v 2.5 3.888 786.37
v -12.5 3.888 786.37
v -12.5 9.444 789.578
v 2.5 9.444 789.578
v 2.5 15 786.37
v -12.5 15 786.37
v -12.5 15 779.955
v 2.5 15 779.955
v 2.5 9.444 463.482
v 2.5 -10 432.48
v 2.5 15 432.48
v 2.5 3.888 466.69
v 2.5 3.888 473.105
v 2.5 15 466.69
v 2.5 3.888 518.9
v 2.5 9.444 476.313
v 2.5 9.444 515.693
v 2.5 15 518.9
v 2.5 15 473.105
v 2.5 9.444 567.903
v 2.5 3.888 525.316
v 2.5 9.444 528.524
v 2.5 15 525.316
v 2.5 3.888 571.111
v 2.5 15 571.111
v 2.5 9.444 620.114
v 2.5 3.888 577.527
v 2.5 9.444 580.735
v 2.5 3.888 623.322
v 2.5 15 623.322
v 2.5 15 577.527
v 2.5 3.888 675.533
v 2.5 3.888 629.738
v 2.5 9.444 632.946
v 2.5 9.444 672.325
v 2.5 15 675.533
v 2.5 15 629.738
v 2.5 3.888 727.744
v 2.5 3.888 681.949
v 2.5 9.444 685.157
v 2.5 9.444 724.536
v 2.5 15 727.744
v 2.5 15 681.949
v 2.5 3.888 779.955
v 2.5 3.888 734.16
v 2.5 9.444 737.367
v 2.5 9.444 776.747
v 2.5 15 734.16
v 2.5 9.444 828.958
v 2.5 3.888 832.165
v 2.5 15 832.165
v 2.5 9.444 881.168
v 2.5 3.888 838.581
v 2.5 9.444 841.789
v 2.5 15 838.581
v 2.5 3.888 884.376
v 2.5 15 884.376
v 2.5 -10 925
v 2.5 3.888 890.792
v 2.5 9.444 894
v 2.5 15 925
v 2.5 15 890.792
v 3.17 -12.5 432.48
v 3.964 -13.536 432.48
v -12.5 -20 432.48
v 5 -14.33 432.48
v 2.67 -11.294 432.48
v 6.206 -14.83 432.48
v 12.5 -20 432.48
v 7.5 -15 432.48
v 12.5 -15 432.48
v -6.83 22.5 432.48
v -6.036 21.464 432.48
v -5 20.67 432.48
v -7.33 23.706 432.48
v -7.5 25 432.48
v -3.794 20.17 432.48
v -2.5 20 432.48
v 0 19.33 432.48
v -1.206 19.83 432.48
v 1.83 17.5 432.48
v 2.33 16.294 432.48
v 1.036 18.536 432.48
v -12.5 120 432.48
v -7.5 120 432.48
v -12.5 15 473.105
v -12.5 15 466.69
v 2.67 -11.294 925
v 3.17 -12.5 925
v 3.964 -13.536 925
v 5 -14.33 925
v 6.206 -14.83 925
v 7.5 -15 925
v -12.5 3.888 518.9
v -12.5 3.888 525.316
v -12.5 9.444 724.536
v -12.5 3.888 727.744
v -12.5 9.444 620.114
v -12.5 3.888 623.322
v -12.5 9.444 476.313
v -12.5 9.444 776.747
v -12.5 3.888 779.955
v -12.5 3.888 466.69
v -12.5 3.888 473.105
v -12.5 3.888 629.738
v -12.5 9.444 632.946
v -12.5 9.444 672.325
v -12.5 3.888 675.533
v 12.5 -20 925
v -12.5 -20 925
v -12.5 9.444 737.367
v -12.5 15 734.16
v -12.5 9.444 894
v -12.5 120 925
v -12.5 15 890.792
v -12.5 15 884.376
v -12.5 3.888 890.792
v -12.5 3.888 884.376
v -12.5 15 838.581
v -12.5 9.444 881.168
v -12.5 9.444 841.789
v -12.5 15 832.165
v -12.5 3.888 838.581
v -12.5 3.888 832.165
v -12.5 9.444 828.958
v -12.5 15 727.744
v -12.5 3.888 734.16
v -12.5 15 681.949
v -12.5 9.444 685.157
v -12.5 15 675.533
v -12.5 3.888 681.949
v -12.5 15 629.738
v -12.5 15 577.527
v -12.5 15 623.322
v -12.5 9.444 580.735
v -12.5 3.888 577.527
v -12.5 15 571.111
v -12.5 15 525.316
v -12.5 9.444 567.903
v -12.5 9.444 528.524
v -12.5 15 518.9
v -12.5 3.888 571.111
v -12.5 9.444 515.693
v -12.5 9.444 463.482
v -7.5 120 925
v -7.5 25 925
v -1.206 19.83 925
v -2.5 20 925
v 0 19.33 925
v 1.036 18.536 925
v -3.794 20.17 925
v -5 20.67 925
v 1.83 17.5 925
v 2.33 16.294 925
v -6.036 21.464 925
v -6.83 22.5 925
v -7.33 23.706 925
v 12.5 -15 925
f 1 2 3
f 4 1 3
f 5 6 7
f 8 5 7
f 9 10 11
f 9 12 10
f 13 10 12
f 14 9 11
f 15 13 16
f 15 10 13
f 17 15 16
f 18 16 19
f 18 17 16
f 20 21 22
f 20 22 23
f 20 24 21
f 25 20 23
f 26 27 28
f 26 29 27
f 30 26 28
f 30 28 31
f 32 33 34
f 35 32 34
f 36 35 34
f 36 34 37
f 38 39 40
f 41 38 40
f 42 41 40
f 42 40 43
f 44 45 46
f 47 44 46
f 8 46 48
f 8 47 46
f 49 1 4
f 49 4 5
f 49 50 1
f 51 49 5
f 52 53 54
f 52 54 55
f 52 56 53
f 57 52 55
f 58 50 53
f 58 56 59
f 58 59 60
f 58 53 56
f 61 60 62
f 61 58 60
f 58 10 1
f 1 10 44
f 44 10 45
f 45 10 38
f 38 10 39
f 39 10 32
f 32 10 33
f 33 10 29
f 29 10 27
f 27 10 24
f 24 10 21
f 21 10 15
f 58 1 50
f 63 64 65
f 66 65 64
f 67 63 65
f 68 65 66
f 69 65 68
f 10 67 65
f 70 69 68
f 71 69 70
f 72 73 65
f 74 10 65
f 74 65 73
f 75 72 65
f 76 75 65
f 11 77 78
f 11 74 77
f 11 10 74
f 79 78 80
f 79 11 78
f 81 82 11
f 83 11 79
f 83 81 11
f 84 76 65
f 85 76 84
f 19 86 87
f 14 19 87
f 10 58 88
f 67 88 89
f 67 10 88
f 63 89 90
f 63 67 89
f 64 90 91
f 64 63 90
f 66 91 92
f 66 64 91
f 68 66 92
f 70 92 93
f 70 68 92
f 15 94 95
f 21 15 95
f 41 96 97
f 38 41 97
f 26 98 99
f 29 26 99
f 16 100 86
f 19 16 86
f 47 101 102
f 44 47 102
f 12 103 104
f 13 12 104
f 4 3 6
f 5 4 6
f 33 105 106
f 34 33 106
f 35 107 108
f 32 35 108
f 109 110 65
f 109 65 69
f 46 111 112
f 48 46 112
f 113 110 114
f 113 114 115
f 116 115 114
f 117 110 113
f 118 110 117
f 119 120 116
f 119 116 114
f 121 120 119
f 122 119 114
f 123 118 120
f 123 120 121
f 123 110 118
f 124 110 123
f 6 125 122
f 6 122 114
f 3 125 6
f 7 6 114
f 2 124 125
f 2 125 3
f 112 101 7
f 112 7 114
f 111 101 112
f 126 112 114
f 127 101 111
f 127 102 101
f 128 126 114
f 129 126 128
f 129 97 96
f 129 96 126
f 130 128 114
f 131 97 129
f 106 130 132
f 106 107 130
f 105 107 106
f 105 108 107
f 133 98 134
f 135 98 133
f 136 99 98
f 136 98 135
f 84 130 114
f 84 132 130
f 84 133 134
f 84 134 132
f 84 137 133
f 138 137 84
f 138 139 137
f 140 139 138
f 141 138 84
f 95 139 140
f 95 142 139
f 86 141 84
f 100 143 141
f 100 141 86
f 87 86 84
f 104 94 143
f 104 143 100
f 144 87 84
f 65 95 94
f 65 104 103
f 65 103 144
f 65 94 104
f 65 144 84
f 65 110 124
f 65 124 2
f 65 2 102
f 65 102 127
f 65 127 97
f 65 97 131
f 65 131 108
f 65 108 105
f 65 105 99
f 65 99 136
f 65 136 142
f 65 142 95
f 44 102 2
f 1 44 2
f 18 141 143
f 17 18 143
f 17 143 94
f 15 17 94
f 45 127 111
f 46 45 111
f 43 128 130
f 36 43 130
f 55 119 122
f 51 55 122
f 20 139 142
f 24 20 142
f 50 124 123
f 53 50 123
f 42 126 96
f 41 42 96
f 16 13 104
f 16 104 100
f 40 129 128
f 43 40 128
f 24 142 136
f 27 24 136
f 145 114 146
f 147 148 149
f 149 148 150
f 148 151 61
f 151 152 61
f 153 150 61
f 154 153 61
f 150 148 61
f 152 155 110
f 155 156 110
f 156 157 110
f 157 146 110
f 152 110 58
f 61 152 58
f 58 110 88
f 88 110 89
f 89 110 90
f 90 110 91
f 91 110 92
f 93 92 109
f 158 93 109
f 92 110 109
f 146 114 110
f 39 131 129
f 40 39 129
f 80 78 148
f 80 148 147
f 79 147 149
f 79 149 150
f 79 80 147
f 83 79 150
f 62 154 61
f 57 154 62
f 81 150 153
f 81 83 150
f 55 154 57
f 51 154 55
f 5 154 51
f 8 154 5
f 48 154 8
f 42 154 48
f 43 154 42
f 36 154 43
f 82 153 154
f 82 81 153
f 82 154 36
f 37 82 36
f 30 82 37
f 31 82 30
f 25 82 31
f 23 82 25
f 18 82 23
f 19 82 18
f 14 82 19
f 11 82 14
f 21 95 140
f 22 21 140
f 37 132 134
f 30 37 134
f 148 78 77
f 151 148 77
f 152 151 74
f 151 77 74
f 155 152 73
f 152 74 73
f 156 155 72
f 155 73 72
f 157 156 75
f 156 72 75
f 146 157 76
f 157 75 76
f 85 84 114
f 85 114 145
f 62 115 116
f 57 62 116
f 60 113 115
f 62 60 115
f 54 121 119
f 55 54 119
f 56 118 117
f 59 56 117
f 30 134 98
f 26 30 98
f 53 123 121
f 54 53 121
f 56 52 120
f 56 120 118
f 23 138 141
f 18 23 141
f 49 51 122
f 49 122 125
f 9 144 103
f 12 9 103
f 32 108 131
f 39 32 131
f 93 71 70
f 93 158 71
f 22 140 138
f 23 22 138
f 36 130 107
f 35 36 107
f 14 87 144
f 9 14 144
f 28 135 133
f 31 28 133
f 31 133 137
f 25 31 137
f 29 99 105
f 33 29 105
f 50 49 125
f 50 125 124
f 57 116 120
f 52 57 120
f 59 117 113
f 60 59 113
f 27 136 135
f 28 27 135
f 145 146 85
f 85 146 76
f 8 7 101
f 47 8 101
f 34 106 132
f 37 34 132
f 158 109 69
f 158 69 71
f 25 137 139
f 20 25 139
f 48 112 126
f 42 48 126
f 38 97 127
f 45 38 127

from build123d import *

# Parameters (mm, degrees)
GENERAL_EXTRUDE_DEPTH       = 925
ROUNDING_R                  = 5
ROLLER_HOLDERS_DEPTH        = 926.55388822
SKETCH5_W                   = 5
SKETCH5_H                   = 1850
GUARD_RAIL_DEPTH            = 100
GUARD_RAIL_SUPPORT_FILLET_R = 5
CUT_TO_SIZE_DEPTH           = 934.086276825
CUT_TO_SIZE_DEPTH_BACK      = 934.086276825
SKETCH6_W                   = 1357.48
SKETCH6_H                   = 140


with BuildPart() as part:
    # Sketch2 → General extrude (new, symmetric)
    with BuildSketch(Plane.XY):
        Polygon((-12.5, 20), (-12.5, -20), (12.5, -20), (12.5, -15), (2.5, -15), (2.5, 20), align=None)
    extrude(amount=GENERAL_EXTRUDE_DEPTH, both=True)

    # Rounding
    rounding_edges = [part.edges().sort_by_distance(p)[0] for p in [
        (2.5, 20, 0),
        (2.5, -15, 0),
    ]]
    fillet(rounding_edges, radius=ROUNDING_R)

    # Sketch3 → Roller holders (cut, through all)
    with BuildSketch(Plane.ZY.offset(12.5)):
        Polygon((-884.3762927, 3.8875), (-881.168390267, 9.44375), (-884.3762927, 15), (-890.792097567, 15), (-894, 9.44375), (-890.792097567, 3.8875), align=None)
        Polygon((-832.165457693, 3.8875), (-828.957555259, 9.44375), (-832.165457693, 15), (-838.581262559, 15), (-841.789164992, 9.44375), (-838.581262559, 3.8875), align=None)
        Polygon((-779.954622685, 3.8875), (-776.746720252, 9.44375), (-779.954622685, 15), (-786.370427551, 15), (-789.578329984, 9.44375), (-786.370427551, 3.8875), align=None)
        Polygon((-727.743787677, 3.8875), (-724.535885244, 9.44375), (-727.743787677, 15), (-734.159592543, 15), (-737.367494976, 9.44375), (-734.159592543, 3.8875), align=None)
        Polygon((-675.532952669, 3.8875), (-672.325050236, 9.44375), (-675.532952669, 15), (-681.948757535, 15), (-685.156659969, 9.44375), (-681.948757535, 3.8875), align=None)
        Polygon((-623.322117661, 3.8875), (-620.114215228, 9.44375), (-623.322117661, 15), (-629.737922528, 15), (-632.945824961, 9.44375), (-629.737922528, 3.8875), align=None)
        Polygon((-571.111282653, 3.8875), (-567.90338022, 9.44375), (-571.111282653, 15), (-577.52708752, 15), (-580.734989953, 9.44375), (-577.52708752, 3.8875), align=None)
        Polygon((-518.900447645, 3.8875), (-515.692545212, 9.44375), (-518.900447645, 15), (-525.316252512, 15), (-528.524154945, 9.44375), (-525.316252512, 3.8875), align=None)
        Polygon((-466.689612638, 3.8875), (-463.481710204, 9.44375), (-466.689612638, 15), (-473.105417504, 15), (-476.313319937, 9.44375), (-473.105417504, 3.8875), align=None)
        Polygon((-414.47877763, 3.8875), (-411.270875197, 9.44375), (-414.47877763, 15), (-420.894582496, 15), (-424.102484929, 9.44375), (-420.894582496, 3.8875), align=None)
        Polygon((-362.267942622, 3.8875), (-359.060040189, 9.44375), (-362.267942622, 15), (-368.683747488, 15), (-371.891649921, 9.44375), (-368.683747488, 3.8875), align=None)
        Polygon((-310.057107614, 3.8875), (-306.849205181, 9.44375), (-310.057107614, 15), (-316.47291248, 15), (-319.680814914, 9.44375), (-316.47291248, 3.8875), align=None)
        Polygon((-257.846272606, 3.8875), (-254.638370173, 9.44375), (-257.846272606, 15), (-264.262077472, 15), (-267.469979906, 9.44375), (-264.262077472, 3.8875), align=None)
        Polygon((-205.635437598, 3.8875), (-202.427535165, 9.44375), (-205.635437598, 15), (-212.051242465, 15), (-215.259144898, 9.44375), (-212.051242465, 3.8875), align=None)
        Polygon((-153.42460259, 3.8875), (-150.216700157, 9.44375), (-153.42460259, 15), (-159.840407457, 15), (-163.04830989, 9.44375), (-159.840407457, 3.8875), align=None)
        Polygon((-101.213767583, 3.8875), (-98.005865149, 9.44375), (-101.213767583, 15), (-107.629572449, 15), (-110.837474882, 9.44375), (-107.629572449, 3.8875), align=None)
        Polygon((-49.002932575, 3.8875), (-45.795030141, 9.44375), (-49.002932575, 15), (-55.418737441, 15), (-58.626639874, 9.44375), (-55.418737441, 3.8875), align=None)
        Polygon((3.207902433, 3.8875), (6.415804866, 9.44375), (3.207902433, 15), (-3.207902433, 15), (-6.415804866, 9.44375), (-3.207902433, 3.8875), align=None)
        Polygon((55.418737441, 3.8875), (58.626639874, 9.44375), (55.418737441, 15), (49.002932575, 15), (45.795030141, 9.44375), (49.002932575, 3.8875), align=None)
        Polygon((107.629572449, 3.8875), (110.837474882, 9.44375), (107.629572449, 15), (101.213767583, 15), (98.005865149, 9.44375), (101.213767583, 3.8875), align=None)
        Polygon((159.840407457, 3.8875), (163.04830989, 9.44375), (159.840407457, 15), (153.42460259, 15), (150.216700157, 9.44375), (153.42460259, 3.8875), align=None)
        Polygon((212.051242465, 3.8875), (215.259144898, 9.44375), (212.051242465, 15), (205.635437598, 15), (202.427535165, 9.44375), (205.635437598, 3.8875), align=None)
        Polygon((264.262077472, 3.8875), (267.469979906, 9.44375), (264.262077472, 15), (257.846272606, 15), (254.638370173, 9.44375), (257.846272606, 3.8875), align=None)
        Polygon((316.47291248, 3.8875), (319.680814914, 9.44375), (316.47291248, 15), (310.057107614, 15), (306.849205181, 9.44375), (310.057107614, 3.8875), align=None)
        Polygon((368.683747488, 3.8875), (371.891649921, 9.44375), (368.683747488, 15), (362.267942622, 15), (359.060040189, 9.44375), (362.267942622, 3.8875), align=None)
        Polygon((420.894582496, 3.8875), (424.102484929, 9.44375), (420.894582496, 15), (414.47877763, 15), (411.270875197, 9.44375), (414.47877763, 3.8875), align=None)
        Polygon((473.105417504, 3.8875), (476.313319937, 9.44375), (473.105417504, 15), (466.689612638, 15), (463.481710204, 9.44375), (466.689612638, 3.8875), align=None)
        Polygon((525.316252512, 3.8875), (528.524154945, 9.44375), (525.316252512, 15), (518.900447645, 15), (515.692545212, 9.44375), (518.900447645, 3.8875), align=None)
        Polygon((577.52708752, 3.8875), (580.734989953, 9.44375), (577.52708752, 15), (571.111282653, 15), (567.90338022, 9.44375), (571.111282653, 3.8875), align=None)
        Polygon((629.737922528, 3.8875), (632.945824961, 9.44375), (629.737922528, 15), (623.322117661, 15), (620.114215228, 9.44375), (623.322117661, 3.8875), align=None)
        Polygon((681.948757535, 3.8875), (685.156659969, 9.44375), (681.948757535, 15), (675.532952669, 15), (672.325050236, 9.44375), (675.532952669, 3.8875), align=None)
        Polygon((734.159592543, 3.8875), (737.367494976, 9.44375), (734.159592543, 15), (727.743787677, 15), (724.535885244, 9.44375), (727.743787677, 3.8875), align=None)
        Polygon((786.370427551, 3.8875), (789.578329984, 9.44375), (786.370427551, 15), (779.954622685, 15), (776.746720252, 9.44375), (779.954622685, 3.8875), align=None)
        Polygon((838.581262559, 3.8875), (841.789164992, 9.44375), (838.581262559, 15), (832.165457693, 15), (828.957555259, 9.44375), (832.165457693, 3.8875), align=None)
        Polygon((890.792097567, 3.8875), (894, 9.44375), (890.792097567, 15), (884.3762927, 15), (881.168390267, 9.44375), (884.3762927, 3.8875), align=None)
    extrude(amount=-ROLLER_HOLDERS_DEPTH, mode=Mode.SUBTRACT)

    # Sketch5 → Guard rail (add)
    with BuildSketch(Plane(origin=(0, 20, 0), x_dir=(1, 0, 0), z_dir=(0, 1, 0))):
        with Locations((-10, 0)):
            Rectangle(SKETCH5_W, SKETCH5_H)
    extrude(amount=GUARD_RAIL_DEPTH)

    # Guard rail support fillet
    guard_rail_support_fillet_edges = [part.edges().sort_by_distance(p)[0] for p in [
        (-7.5, 20, 0),
    ]]
    fillet(guard_rail_support_fillet_edges, radius=GUARD_RAIL_SUPPORT_FILLET_R - 0.0001)  # a hair under: the kernel refuses the full size

    # Sketch6 → CUT TO SIZE (cut, two sides: drawn at the far end of the back side and taken through both)
    with BuildSketch(Plane.ZY.offset(12.5).offset(-CUT_TO_SIZE_DEPTH_BACK)):
        with Locations((-246.26, 50)):
            Rectangle(SKETCH6_W, SKETCH6_H)
    extrude(amount=CUT_TO_SIZE_DEPTH + CUT_TO_SIZE_DEPTH_BACK, mode=Mode.SUBTRACT)


solid = part.part
